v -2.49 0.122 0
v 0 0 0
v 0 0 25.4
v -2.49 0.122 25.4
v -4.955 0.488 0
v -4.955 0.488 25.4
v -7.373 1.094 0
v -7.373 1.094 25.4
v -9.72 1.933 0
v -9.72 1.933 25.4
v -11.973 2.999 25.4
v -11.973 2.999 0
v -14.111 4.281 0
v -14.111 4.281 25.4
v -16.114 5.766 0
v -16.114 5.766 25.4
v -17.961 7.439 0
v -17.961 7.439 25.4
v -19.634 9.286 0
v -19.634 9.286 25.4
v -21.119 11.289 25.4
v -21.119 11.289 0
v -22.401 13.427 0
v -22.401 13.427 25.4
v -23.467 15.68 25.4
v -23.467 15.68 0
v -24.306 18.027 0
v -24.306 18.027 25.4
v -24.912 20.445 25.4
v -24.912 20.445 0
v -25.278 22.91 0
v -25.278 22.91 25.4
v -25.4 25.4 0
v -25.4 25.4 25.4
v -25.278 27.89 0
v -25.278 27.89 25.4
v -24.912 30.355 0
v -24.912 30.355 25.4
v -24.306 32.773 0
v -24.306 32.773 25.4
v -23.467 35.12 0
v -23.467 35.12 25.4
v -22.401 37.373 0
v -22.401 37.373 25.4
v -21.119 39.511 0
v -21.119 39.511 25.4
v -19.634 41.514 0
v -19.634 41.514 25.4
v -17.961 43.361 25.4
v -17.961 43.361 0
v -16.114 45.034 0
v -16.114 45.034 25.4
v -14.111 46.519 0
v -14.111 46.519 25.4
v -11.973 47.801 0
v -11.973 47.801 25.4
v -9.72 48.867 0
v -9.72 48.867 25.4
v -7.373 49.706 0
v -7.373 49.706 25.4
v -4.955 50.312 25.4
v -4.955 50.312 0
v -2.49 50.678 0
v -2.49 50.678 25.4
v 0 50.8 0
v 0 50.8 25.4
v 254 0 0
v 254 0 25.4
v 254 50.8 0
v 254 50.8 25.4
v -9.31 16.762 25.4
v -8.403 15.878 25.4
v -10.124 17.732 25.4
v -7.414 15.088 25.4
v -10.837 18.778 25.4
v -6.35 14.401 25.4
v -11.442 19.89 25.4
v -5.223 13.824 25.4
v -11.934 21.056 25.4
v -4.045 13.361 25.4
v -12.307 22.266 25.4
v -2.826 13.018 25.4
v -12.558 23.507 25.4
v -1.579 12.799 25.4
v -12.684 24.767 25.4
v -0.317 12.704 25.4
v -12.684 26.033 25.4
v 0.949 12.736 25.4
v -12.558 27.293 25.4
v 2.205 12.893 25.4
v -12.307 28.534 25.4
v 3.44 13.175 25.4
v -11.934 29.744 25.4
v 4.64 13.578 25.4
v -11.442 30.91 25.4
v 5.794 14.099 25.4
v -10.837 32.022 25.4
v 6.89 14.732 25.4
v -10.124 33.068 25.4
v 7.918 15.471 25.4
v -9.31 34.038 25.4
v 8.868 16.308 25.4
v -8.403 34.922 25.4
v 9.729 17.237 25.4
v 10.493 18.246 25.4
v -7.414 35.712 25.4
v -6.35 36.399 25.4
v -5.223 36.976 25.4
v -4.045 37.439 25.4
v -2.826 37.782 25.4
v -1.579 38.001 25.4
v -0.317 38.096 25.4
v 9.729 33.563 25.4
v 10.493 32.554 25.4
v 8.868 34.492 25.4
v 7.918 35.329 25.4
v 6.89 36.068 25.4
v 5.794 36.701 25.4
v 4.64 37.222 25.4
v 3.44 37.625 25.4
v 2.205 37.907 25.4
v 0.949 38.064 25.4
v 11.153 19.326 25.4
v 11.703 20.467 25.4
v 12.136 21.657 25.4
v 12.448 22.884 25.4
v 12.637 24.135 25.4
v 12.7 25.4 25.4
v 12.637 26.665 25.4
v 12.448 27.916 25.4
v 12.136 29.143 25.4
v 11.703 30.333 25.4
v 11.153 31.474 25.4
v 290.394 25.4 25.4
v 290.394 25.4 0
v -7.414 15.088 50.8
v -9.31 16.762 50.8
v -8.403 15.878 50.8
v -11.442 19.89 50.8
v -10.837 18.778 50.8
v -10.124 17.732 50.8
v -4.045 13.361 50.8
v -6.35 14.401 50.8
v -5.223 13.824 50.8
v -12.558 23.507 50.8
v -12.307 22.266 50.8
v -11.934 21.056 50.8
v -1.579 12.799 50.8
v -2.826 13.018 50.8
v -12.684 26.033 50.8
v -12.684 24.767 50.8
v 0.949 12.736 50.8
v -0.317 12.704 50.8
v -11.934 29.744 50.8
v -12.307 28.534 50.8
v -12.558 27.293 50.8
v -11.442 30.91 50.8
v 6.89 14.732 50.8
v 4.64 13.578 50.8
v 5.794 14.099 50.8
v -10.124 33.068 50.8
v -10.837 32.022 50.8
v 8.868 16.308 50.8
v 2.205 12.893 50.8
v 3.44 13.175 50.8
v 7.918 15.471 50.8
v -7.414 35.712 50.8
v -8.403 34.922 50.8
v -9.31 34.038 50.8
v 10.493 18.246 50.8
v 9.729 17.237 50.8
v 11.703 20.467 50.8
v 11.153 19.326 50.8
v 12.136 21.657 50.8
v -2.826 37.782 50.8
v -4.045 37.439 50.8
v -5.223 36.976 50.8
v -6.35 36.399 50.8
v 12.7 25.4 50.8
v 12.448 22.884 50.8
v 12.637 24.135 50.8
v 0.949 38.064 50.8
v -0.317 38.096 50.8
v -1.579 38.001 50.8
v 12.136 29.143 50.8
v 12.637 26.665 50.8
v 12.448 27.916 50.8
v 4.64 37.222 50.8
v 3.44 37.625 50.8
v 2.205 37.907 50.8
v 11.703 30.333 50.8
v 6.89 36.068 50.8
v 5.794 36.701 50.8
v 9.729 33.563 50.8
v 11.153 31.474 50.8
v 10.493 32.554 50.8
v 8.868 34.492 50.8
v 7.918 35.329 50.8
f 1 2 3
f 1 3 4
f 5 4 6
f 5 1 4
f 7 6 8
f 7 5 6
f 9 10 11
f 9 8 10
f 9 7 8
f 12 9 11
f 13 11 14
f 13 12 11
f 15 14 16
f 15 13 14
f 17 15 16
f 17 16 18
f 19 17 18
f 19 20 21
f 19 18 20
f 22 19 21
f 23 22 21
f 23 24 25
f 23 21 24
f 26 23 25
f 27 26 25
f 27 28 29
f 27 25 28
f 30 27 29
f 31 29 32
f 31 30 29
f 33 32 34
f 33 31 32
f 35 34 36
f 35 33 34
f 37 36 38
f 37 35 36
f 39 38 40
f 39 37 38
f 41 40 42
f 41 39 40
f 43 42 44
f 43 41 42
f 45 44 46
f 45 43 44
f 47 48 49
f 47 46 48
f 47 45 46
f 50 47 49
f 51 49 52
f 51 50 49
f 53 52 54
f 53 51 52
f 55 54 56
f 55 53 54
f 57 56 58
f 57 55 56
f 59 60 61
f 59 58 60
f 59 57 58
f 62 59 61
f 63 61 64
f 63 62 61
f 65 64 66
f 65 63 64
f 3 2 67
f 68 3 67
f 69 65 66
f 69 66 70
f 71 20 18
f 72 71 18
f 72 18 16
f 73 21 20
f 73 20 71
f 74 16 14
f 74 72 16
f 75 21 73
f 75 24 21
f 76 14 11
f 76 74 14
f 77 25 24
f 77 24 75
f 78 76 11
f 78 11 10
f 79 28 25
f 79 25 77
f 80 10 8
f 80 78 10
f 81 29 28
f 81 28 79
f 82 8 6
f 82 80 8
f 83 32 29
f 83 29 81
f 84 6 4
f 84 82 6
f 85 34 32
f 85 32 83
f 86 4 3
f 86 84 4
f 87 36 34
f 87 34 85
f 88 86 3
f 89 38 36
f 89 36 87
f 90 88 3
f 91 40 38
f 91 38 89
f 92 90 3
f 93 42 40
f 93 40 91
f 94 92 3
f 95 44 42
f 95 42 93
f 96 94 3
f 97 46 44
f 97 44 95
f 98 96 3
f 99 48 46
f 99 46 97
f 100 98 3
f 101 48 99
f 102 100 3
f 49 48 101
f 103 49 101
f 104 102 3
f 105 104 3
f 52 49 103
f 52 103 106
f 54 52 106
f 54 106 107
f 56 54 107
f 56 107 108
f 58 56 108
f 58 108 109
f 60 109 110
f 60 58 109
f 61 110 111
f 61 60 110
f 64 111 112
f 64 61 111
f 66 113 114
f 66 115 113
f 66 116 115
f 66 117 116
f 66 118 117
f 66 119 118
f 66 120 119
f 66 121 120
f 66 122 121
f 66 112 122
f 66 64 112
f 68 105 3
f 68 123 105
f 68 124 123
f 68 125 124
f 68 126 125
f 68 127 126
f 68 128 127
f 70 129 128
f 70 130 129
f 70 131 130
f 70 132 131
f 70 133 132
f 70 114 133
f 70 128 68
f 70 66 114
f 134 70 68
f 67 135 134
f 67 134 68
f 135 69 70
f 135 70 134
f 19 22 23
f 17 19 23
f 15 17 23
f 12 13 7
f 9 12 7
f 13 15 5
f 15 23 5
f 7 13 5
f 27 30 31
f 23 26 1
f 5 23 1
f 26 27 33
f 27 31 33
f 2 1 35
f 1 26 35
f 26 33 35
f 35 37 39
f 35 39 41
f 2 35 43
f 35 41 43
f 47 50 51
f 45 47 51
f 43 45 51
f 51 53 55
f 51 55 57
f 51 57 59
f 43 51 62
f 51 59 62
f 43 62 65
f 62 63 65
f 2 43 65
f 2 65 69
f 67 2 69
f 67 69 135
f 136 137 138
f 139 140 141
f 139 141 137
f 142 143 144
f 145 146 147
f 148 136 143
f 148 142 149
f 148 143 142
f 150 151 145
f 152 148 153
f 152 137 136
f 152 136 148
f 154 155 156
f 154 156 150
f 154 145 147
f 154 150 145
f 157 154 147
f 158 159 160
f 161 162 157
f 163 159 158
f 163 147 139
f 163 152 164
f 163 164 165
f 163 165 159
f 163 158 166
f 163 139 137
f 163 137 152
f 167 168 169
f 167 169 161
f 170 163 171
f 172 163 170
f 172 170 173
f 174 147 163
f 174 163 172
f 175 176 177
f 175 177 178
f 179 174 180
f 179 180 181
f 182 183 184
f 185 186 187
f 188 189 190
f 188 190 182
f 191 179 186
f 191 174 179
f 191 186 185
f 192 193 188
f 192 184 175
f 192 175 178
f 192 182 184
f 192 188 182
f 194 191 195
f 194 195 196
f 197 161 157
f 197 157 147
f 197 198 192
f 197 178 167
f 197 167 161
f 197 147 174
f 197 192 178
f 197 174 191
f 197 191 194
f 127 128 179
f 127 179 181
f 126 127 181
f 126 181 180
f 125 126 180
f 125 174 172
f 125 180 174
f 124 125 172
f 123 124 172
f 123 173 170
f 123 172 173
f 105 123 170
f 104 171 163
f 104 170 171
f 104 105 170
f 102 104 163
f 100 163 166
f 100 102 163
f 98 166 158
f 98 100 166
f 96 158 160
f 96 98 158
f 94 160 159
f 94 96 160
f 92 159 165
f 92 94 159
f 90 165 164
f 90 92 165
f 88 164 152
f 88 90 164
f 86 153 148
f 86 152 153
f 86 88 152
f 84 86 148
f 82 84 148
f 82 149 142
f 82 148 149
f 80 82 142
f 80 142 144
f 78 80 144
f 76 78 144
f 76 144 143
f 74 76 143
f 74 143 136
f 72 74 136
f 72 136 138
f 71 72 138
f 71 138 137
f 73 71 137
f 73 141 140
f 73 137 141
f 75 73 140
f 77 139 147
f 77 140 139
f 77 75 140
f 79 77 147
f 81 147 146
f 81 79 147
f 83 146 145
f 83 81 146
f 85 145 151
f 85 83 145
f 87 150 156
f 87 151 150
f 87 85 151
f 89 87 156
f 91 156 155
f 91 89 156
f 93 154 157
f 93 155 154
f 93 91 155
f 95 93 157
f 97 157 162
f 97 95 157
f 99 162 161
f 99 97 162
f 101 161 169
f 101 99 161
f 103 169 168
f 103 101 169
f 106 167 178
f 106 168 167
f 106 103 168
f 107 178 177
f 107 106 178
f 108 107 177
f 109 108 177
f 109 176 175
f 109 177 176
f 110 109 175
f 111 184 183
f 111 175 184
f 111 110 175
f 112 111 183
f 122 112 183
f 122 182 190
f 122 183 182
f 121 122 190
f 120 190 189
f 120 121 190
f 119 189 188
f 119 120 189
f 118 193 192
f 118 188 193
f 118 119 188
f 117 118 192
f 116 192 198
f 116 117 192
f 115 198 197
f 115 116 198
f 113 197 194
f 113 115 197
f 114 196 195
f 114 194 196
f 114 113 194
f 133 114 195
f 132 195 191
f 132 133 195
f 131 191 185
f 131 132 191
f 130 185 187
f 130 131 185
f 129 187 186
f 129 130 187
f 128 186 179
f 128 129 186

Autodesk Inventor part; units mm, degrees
ref_plane "YZ Plane" through (0, 0, 0) normal (1, 0, 0) x (0, 1, 0)
ref_plane "XZ Plane" through (0, 0, 0) normal (0, 1, 0) x (-1, 0, 0)
ref_plane "XY Plane" through (0, 0, 0) normal (0, 0, 1) x (1, 0, 0)
sketch "Sketch1" plane through (0, 0, 0) normal (0, 0, 1) x (1, 0, 0)
  line L0 (0, 0) -> (254, 0)
  line L1 (0, 50.8) -> (254, 50.8)
  arc A0 (0, 50.8) -> (0, 0) centre (0, 25.4) ccw
  line L2 (254, 50.8) -> (290.3943, 25.4)
  line L3 (290.3943, 25.4) -> (254, 0)
  circle A1 centre (0, 25.4) radius 12.7
  dimension "d0" = 254
  dimension "d1" = 254
  dimension "d2" = 50.8
  dimension "d3" = 25.4
  dimension "d4" = 25.4
extrude "Extrusion1" add sketch "Sketch1" along normal blind 25.4 contours A0 L1 L2 L3 L0 | A1
sketch "Sketch2" plane through (0, 0, 25.4) normal (0, 0, 1) x (1, 0, 0)
  circle A0 centre (0, 25.4) radius 12.7
  arc A1 (0, 50.8) -> (0, 0) centre (0, 25.4) ccw projected
  dimension "d7" = 25.4
extrude "Extrusion2" add sketch "Sketch2" along normal blind 25.4
properties part number "Punta de flecha"
